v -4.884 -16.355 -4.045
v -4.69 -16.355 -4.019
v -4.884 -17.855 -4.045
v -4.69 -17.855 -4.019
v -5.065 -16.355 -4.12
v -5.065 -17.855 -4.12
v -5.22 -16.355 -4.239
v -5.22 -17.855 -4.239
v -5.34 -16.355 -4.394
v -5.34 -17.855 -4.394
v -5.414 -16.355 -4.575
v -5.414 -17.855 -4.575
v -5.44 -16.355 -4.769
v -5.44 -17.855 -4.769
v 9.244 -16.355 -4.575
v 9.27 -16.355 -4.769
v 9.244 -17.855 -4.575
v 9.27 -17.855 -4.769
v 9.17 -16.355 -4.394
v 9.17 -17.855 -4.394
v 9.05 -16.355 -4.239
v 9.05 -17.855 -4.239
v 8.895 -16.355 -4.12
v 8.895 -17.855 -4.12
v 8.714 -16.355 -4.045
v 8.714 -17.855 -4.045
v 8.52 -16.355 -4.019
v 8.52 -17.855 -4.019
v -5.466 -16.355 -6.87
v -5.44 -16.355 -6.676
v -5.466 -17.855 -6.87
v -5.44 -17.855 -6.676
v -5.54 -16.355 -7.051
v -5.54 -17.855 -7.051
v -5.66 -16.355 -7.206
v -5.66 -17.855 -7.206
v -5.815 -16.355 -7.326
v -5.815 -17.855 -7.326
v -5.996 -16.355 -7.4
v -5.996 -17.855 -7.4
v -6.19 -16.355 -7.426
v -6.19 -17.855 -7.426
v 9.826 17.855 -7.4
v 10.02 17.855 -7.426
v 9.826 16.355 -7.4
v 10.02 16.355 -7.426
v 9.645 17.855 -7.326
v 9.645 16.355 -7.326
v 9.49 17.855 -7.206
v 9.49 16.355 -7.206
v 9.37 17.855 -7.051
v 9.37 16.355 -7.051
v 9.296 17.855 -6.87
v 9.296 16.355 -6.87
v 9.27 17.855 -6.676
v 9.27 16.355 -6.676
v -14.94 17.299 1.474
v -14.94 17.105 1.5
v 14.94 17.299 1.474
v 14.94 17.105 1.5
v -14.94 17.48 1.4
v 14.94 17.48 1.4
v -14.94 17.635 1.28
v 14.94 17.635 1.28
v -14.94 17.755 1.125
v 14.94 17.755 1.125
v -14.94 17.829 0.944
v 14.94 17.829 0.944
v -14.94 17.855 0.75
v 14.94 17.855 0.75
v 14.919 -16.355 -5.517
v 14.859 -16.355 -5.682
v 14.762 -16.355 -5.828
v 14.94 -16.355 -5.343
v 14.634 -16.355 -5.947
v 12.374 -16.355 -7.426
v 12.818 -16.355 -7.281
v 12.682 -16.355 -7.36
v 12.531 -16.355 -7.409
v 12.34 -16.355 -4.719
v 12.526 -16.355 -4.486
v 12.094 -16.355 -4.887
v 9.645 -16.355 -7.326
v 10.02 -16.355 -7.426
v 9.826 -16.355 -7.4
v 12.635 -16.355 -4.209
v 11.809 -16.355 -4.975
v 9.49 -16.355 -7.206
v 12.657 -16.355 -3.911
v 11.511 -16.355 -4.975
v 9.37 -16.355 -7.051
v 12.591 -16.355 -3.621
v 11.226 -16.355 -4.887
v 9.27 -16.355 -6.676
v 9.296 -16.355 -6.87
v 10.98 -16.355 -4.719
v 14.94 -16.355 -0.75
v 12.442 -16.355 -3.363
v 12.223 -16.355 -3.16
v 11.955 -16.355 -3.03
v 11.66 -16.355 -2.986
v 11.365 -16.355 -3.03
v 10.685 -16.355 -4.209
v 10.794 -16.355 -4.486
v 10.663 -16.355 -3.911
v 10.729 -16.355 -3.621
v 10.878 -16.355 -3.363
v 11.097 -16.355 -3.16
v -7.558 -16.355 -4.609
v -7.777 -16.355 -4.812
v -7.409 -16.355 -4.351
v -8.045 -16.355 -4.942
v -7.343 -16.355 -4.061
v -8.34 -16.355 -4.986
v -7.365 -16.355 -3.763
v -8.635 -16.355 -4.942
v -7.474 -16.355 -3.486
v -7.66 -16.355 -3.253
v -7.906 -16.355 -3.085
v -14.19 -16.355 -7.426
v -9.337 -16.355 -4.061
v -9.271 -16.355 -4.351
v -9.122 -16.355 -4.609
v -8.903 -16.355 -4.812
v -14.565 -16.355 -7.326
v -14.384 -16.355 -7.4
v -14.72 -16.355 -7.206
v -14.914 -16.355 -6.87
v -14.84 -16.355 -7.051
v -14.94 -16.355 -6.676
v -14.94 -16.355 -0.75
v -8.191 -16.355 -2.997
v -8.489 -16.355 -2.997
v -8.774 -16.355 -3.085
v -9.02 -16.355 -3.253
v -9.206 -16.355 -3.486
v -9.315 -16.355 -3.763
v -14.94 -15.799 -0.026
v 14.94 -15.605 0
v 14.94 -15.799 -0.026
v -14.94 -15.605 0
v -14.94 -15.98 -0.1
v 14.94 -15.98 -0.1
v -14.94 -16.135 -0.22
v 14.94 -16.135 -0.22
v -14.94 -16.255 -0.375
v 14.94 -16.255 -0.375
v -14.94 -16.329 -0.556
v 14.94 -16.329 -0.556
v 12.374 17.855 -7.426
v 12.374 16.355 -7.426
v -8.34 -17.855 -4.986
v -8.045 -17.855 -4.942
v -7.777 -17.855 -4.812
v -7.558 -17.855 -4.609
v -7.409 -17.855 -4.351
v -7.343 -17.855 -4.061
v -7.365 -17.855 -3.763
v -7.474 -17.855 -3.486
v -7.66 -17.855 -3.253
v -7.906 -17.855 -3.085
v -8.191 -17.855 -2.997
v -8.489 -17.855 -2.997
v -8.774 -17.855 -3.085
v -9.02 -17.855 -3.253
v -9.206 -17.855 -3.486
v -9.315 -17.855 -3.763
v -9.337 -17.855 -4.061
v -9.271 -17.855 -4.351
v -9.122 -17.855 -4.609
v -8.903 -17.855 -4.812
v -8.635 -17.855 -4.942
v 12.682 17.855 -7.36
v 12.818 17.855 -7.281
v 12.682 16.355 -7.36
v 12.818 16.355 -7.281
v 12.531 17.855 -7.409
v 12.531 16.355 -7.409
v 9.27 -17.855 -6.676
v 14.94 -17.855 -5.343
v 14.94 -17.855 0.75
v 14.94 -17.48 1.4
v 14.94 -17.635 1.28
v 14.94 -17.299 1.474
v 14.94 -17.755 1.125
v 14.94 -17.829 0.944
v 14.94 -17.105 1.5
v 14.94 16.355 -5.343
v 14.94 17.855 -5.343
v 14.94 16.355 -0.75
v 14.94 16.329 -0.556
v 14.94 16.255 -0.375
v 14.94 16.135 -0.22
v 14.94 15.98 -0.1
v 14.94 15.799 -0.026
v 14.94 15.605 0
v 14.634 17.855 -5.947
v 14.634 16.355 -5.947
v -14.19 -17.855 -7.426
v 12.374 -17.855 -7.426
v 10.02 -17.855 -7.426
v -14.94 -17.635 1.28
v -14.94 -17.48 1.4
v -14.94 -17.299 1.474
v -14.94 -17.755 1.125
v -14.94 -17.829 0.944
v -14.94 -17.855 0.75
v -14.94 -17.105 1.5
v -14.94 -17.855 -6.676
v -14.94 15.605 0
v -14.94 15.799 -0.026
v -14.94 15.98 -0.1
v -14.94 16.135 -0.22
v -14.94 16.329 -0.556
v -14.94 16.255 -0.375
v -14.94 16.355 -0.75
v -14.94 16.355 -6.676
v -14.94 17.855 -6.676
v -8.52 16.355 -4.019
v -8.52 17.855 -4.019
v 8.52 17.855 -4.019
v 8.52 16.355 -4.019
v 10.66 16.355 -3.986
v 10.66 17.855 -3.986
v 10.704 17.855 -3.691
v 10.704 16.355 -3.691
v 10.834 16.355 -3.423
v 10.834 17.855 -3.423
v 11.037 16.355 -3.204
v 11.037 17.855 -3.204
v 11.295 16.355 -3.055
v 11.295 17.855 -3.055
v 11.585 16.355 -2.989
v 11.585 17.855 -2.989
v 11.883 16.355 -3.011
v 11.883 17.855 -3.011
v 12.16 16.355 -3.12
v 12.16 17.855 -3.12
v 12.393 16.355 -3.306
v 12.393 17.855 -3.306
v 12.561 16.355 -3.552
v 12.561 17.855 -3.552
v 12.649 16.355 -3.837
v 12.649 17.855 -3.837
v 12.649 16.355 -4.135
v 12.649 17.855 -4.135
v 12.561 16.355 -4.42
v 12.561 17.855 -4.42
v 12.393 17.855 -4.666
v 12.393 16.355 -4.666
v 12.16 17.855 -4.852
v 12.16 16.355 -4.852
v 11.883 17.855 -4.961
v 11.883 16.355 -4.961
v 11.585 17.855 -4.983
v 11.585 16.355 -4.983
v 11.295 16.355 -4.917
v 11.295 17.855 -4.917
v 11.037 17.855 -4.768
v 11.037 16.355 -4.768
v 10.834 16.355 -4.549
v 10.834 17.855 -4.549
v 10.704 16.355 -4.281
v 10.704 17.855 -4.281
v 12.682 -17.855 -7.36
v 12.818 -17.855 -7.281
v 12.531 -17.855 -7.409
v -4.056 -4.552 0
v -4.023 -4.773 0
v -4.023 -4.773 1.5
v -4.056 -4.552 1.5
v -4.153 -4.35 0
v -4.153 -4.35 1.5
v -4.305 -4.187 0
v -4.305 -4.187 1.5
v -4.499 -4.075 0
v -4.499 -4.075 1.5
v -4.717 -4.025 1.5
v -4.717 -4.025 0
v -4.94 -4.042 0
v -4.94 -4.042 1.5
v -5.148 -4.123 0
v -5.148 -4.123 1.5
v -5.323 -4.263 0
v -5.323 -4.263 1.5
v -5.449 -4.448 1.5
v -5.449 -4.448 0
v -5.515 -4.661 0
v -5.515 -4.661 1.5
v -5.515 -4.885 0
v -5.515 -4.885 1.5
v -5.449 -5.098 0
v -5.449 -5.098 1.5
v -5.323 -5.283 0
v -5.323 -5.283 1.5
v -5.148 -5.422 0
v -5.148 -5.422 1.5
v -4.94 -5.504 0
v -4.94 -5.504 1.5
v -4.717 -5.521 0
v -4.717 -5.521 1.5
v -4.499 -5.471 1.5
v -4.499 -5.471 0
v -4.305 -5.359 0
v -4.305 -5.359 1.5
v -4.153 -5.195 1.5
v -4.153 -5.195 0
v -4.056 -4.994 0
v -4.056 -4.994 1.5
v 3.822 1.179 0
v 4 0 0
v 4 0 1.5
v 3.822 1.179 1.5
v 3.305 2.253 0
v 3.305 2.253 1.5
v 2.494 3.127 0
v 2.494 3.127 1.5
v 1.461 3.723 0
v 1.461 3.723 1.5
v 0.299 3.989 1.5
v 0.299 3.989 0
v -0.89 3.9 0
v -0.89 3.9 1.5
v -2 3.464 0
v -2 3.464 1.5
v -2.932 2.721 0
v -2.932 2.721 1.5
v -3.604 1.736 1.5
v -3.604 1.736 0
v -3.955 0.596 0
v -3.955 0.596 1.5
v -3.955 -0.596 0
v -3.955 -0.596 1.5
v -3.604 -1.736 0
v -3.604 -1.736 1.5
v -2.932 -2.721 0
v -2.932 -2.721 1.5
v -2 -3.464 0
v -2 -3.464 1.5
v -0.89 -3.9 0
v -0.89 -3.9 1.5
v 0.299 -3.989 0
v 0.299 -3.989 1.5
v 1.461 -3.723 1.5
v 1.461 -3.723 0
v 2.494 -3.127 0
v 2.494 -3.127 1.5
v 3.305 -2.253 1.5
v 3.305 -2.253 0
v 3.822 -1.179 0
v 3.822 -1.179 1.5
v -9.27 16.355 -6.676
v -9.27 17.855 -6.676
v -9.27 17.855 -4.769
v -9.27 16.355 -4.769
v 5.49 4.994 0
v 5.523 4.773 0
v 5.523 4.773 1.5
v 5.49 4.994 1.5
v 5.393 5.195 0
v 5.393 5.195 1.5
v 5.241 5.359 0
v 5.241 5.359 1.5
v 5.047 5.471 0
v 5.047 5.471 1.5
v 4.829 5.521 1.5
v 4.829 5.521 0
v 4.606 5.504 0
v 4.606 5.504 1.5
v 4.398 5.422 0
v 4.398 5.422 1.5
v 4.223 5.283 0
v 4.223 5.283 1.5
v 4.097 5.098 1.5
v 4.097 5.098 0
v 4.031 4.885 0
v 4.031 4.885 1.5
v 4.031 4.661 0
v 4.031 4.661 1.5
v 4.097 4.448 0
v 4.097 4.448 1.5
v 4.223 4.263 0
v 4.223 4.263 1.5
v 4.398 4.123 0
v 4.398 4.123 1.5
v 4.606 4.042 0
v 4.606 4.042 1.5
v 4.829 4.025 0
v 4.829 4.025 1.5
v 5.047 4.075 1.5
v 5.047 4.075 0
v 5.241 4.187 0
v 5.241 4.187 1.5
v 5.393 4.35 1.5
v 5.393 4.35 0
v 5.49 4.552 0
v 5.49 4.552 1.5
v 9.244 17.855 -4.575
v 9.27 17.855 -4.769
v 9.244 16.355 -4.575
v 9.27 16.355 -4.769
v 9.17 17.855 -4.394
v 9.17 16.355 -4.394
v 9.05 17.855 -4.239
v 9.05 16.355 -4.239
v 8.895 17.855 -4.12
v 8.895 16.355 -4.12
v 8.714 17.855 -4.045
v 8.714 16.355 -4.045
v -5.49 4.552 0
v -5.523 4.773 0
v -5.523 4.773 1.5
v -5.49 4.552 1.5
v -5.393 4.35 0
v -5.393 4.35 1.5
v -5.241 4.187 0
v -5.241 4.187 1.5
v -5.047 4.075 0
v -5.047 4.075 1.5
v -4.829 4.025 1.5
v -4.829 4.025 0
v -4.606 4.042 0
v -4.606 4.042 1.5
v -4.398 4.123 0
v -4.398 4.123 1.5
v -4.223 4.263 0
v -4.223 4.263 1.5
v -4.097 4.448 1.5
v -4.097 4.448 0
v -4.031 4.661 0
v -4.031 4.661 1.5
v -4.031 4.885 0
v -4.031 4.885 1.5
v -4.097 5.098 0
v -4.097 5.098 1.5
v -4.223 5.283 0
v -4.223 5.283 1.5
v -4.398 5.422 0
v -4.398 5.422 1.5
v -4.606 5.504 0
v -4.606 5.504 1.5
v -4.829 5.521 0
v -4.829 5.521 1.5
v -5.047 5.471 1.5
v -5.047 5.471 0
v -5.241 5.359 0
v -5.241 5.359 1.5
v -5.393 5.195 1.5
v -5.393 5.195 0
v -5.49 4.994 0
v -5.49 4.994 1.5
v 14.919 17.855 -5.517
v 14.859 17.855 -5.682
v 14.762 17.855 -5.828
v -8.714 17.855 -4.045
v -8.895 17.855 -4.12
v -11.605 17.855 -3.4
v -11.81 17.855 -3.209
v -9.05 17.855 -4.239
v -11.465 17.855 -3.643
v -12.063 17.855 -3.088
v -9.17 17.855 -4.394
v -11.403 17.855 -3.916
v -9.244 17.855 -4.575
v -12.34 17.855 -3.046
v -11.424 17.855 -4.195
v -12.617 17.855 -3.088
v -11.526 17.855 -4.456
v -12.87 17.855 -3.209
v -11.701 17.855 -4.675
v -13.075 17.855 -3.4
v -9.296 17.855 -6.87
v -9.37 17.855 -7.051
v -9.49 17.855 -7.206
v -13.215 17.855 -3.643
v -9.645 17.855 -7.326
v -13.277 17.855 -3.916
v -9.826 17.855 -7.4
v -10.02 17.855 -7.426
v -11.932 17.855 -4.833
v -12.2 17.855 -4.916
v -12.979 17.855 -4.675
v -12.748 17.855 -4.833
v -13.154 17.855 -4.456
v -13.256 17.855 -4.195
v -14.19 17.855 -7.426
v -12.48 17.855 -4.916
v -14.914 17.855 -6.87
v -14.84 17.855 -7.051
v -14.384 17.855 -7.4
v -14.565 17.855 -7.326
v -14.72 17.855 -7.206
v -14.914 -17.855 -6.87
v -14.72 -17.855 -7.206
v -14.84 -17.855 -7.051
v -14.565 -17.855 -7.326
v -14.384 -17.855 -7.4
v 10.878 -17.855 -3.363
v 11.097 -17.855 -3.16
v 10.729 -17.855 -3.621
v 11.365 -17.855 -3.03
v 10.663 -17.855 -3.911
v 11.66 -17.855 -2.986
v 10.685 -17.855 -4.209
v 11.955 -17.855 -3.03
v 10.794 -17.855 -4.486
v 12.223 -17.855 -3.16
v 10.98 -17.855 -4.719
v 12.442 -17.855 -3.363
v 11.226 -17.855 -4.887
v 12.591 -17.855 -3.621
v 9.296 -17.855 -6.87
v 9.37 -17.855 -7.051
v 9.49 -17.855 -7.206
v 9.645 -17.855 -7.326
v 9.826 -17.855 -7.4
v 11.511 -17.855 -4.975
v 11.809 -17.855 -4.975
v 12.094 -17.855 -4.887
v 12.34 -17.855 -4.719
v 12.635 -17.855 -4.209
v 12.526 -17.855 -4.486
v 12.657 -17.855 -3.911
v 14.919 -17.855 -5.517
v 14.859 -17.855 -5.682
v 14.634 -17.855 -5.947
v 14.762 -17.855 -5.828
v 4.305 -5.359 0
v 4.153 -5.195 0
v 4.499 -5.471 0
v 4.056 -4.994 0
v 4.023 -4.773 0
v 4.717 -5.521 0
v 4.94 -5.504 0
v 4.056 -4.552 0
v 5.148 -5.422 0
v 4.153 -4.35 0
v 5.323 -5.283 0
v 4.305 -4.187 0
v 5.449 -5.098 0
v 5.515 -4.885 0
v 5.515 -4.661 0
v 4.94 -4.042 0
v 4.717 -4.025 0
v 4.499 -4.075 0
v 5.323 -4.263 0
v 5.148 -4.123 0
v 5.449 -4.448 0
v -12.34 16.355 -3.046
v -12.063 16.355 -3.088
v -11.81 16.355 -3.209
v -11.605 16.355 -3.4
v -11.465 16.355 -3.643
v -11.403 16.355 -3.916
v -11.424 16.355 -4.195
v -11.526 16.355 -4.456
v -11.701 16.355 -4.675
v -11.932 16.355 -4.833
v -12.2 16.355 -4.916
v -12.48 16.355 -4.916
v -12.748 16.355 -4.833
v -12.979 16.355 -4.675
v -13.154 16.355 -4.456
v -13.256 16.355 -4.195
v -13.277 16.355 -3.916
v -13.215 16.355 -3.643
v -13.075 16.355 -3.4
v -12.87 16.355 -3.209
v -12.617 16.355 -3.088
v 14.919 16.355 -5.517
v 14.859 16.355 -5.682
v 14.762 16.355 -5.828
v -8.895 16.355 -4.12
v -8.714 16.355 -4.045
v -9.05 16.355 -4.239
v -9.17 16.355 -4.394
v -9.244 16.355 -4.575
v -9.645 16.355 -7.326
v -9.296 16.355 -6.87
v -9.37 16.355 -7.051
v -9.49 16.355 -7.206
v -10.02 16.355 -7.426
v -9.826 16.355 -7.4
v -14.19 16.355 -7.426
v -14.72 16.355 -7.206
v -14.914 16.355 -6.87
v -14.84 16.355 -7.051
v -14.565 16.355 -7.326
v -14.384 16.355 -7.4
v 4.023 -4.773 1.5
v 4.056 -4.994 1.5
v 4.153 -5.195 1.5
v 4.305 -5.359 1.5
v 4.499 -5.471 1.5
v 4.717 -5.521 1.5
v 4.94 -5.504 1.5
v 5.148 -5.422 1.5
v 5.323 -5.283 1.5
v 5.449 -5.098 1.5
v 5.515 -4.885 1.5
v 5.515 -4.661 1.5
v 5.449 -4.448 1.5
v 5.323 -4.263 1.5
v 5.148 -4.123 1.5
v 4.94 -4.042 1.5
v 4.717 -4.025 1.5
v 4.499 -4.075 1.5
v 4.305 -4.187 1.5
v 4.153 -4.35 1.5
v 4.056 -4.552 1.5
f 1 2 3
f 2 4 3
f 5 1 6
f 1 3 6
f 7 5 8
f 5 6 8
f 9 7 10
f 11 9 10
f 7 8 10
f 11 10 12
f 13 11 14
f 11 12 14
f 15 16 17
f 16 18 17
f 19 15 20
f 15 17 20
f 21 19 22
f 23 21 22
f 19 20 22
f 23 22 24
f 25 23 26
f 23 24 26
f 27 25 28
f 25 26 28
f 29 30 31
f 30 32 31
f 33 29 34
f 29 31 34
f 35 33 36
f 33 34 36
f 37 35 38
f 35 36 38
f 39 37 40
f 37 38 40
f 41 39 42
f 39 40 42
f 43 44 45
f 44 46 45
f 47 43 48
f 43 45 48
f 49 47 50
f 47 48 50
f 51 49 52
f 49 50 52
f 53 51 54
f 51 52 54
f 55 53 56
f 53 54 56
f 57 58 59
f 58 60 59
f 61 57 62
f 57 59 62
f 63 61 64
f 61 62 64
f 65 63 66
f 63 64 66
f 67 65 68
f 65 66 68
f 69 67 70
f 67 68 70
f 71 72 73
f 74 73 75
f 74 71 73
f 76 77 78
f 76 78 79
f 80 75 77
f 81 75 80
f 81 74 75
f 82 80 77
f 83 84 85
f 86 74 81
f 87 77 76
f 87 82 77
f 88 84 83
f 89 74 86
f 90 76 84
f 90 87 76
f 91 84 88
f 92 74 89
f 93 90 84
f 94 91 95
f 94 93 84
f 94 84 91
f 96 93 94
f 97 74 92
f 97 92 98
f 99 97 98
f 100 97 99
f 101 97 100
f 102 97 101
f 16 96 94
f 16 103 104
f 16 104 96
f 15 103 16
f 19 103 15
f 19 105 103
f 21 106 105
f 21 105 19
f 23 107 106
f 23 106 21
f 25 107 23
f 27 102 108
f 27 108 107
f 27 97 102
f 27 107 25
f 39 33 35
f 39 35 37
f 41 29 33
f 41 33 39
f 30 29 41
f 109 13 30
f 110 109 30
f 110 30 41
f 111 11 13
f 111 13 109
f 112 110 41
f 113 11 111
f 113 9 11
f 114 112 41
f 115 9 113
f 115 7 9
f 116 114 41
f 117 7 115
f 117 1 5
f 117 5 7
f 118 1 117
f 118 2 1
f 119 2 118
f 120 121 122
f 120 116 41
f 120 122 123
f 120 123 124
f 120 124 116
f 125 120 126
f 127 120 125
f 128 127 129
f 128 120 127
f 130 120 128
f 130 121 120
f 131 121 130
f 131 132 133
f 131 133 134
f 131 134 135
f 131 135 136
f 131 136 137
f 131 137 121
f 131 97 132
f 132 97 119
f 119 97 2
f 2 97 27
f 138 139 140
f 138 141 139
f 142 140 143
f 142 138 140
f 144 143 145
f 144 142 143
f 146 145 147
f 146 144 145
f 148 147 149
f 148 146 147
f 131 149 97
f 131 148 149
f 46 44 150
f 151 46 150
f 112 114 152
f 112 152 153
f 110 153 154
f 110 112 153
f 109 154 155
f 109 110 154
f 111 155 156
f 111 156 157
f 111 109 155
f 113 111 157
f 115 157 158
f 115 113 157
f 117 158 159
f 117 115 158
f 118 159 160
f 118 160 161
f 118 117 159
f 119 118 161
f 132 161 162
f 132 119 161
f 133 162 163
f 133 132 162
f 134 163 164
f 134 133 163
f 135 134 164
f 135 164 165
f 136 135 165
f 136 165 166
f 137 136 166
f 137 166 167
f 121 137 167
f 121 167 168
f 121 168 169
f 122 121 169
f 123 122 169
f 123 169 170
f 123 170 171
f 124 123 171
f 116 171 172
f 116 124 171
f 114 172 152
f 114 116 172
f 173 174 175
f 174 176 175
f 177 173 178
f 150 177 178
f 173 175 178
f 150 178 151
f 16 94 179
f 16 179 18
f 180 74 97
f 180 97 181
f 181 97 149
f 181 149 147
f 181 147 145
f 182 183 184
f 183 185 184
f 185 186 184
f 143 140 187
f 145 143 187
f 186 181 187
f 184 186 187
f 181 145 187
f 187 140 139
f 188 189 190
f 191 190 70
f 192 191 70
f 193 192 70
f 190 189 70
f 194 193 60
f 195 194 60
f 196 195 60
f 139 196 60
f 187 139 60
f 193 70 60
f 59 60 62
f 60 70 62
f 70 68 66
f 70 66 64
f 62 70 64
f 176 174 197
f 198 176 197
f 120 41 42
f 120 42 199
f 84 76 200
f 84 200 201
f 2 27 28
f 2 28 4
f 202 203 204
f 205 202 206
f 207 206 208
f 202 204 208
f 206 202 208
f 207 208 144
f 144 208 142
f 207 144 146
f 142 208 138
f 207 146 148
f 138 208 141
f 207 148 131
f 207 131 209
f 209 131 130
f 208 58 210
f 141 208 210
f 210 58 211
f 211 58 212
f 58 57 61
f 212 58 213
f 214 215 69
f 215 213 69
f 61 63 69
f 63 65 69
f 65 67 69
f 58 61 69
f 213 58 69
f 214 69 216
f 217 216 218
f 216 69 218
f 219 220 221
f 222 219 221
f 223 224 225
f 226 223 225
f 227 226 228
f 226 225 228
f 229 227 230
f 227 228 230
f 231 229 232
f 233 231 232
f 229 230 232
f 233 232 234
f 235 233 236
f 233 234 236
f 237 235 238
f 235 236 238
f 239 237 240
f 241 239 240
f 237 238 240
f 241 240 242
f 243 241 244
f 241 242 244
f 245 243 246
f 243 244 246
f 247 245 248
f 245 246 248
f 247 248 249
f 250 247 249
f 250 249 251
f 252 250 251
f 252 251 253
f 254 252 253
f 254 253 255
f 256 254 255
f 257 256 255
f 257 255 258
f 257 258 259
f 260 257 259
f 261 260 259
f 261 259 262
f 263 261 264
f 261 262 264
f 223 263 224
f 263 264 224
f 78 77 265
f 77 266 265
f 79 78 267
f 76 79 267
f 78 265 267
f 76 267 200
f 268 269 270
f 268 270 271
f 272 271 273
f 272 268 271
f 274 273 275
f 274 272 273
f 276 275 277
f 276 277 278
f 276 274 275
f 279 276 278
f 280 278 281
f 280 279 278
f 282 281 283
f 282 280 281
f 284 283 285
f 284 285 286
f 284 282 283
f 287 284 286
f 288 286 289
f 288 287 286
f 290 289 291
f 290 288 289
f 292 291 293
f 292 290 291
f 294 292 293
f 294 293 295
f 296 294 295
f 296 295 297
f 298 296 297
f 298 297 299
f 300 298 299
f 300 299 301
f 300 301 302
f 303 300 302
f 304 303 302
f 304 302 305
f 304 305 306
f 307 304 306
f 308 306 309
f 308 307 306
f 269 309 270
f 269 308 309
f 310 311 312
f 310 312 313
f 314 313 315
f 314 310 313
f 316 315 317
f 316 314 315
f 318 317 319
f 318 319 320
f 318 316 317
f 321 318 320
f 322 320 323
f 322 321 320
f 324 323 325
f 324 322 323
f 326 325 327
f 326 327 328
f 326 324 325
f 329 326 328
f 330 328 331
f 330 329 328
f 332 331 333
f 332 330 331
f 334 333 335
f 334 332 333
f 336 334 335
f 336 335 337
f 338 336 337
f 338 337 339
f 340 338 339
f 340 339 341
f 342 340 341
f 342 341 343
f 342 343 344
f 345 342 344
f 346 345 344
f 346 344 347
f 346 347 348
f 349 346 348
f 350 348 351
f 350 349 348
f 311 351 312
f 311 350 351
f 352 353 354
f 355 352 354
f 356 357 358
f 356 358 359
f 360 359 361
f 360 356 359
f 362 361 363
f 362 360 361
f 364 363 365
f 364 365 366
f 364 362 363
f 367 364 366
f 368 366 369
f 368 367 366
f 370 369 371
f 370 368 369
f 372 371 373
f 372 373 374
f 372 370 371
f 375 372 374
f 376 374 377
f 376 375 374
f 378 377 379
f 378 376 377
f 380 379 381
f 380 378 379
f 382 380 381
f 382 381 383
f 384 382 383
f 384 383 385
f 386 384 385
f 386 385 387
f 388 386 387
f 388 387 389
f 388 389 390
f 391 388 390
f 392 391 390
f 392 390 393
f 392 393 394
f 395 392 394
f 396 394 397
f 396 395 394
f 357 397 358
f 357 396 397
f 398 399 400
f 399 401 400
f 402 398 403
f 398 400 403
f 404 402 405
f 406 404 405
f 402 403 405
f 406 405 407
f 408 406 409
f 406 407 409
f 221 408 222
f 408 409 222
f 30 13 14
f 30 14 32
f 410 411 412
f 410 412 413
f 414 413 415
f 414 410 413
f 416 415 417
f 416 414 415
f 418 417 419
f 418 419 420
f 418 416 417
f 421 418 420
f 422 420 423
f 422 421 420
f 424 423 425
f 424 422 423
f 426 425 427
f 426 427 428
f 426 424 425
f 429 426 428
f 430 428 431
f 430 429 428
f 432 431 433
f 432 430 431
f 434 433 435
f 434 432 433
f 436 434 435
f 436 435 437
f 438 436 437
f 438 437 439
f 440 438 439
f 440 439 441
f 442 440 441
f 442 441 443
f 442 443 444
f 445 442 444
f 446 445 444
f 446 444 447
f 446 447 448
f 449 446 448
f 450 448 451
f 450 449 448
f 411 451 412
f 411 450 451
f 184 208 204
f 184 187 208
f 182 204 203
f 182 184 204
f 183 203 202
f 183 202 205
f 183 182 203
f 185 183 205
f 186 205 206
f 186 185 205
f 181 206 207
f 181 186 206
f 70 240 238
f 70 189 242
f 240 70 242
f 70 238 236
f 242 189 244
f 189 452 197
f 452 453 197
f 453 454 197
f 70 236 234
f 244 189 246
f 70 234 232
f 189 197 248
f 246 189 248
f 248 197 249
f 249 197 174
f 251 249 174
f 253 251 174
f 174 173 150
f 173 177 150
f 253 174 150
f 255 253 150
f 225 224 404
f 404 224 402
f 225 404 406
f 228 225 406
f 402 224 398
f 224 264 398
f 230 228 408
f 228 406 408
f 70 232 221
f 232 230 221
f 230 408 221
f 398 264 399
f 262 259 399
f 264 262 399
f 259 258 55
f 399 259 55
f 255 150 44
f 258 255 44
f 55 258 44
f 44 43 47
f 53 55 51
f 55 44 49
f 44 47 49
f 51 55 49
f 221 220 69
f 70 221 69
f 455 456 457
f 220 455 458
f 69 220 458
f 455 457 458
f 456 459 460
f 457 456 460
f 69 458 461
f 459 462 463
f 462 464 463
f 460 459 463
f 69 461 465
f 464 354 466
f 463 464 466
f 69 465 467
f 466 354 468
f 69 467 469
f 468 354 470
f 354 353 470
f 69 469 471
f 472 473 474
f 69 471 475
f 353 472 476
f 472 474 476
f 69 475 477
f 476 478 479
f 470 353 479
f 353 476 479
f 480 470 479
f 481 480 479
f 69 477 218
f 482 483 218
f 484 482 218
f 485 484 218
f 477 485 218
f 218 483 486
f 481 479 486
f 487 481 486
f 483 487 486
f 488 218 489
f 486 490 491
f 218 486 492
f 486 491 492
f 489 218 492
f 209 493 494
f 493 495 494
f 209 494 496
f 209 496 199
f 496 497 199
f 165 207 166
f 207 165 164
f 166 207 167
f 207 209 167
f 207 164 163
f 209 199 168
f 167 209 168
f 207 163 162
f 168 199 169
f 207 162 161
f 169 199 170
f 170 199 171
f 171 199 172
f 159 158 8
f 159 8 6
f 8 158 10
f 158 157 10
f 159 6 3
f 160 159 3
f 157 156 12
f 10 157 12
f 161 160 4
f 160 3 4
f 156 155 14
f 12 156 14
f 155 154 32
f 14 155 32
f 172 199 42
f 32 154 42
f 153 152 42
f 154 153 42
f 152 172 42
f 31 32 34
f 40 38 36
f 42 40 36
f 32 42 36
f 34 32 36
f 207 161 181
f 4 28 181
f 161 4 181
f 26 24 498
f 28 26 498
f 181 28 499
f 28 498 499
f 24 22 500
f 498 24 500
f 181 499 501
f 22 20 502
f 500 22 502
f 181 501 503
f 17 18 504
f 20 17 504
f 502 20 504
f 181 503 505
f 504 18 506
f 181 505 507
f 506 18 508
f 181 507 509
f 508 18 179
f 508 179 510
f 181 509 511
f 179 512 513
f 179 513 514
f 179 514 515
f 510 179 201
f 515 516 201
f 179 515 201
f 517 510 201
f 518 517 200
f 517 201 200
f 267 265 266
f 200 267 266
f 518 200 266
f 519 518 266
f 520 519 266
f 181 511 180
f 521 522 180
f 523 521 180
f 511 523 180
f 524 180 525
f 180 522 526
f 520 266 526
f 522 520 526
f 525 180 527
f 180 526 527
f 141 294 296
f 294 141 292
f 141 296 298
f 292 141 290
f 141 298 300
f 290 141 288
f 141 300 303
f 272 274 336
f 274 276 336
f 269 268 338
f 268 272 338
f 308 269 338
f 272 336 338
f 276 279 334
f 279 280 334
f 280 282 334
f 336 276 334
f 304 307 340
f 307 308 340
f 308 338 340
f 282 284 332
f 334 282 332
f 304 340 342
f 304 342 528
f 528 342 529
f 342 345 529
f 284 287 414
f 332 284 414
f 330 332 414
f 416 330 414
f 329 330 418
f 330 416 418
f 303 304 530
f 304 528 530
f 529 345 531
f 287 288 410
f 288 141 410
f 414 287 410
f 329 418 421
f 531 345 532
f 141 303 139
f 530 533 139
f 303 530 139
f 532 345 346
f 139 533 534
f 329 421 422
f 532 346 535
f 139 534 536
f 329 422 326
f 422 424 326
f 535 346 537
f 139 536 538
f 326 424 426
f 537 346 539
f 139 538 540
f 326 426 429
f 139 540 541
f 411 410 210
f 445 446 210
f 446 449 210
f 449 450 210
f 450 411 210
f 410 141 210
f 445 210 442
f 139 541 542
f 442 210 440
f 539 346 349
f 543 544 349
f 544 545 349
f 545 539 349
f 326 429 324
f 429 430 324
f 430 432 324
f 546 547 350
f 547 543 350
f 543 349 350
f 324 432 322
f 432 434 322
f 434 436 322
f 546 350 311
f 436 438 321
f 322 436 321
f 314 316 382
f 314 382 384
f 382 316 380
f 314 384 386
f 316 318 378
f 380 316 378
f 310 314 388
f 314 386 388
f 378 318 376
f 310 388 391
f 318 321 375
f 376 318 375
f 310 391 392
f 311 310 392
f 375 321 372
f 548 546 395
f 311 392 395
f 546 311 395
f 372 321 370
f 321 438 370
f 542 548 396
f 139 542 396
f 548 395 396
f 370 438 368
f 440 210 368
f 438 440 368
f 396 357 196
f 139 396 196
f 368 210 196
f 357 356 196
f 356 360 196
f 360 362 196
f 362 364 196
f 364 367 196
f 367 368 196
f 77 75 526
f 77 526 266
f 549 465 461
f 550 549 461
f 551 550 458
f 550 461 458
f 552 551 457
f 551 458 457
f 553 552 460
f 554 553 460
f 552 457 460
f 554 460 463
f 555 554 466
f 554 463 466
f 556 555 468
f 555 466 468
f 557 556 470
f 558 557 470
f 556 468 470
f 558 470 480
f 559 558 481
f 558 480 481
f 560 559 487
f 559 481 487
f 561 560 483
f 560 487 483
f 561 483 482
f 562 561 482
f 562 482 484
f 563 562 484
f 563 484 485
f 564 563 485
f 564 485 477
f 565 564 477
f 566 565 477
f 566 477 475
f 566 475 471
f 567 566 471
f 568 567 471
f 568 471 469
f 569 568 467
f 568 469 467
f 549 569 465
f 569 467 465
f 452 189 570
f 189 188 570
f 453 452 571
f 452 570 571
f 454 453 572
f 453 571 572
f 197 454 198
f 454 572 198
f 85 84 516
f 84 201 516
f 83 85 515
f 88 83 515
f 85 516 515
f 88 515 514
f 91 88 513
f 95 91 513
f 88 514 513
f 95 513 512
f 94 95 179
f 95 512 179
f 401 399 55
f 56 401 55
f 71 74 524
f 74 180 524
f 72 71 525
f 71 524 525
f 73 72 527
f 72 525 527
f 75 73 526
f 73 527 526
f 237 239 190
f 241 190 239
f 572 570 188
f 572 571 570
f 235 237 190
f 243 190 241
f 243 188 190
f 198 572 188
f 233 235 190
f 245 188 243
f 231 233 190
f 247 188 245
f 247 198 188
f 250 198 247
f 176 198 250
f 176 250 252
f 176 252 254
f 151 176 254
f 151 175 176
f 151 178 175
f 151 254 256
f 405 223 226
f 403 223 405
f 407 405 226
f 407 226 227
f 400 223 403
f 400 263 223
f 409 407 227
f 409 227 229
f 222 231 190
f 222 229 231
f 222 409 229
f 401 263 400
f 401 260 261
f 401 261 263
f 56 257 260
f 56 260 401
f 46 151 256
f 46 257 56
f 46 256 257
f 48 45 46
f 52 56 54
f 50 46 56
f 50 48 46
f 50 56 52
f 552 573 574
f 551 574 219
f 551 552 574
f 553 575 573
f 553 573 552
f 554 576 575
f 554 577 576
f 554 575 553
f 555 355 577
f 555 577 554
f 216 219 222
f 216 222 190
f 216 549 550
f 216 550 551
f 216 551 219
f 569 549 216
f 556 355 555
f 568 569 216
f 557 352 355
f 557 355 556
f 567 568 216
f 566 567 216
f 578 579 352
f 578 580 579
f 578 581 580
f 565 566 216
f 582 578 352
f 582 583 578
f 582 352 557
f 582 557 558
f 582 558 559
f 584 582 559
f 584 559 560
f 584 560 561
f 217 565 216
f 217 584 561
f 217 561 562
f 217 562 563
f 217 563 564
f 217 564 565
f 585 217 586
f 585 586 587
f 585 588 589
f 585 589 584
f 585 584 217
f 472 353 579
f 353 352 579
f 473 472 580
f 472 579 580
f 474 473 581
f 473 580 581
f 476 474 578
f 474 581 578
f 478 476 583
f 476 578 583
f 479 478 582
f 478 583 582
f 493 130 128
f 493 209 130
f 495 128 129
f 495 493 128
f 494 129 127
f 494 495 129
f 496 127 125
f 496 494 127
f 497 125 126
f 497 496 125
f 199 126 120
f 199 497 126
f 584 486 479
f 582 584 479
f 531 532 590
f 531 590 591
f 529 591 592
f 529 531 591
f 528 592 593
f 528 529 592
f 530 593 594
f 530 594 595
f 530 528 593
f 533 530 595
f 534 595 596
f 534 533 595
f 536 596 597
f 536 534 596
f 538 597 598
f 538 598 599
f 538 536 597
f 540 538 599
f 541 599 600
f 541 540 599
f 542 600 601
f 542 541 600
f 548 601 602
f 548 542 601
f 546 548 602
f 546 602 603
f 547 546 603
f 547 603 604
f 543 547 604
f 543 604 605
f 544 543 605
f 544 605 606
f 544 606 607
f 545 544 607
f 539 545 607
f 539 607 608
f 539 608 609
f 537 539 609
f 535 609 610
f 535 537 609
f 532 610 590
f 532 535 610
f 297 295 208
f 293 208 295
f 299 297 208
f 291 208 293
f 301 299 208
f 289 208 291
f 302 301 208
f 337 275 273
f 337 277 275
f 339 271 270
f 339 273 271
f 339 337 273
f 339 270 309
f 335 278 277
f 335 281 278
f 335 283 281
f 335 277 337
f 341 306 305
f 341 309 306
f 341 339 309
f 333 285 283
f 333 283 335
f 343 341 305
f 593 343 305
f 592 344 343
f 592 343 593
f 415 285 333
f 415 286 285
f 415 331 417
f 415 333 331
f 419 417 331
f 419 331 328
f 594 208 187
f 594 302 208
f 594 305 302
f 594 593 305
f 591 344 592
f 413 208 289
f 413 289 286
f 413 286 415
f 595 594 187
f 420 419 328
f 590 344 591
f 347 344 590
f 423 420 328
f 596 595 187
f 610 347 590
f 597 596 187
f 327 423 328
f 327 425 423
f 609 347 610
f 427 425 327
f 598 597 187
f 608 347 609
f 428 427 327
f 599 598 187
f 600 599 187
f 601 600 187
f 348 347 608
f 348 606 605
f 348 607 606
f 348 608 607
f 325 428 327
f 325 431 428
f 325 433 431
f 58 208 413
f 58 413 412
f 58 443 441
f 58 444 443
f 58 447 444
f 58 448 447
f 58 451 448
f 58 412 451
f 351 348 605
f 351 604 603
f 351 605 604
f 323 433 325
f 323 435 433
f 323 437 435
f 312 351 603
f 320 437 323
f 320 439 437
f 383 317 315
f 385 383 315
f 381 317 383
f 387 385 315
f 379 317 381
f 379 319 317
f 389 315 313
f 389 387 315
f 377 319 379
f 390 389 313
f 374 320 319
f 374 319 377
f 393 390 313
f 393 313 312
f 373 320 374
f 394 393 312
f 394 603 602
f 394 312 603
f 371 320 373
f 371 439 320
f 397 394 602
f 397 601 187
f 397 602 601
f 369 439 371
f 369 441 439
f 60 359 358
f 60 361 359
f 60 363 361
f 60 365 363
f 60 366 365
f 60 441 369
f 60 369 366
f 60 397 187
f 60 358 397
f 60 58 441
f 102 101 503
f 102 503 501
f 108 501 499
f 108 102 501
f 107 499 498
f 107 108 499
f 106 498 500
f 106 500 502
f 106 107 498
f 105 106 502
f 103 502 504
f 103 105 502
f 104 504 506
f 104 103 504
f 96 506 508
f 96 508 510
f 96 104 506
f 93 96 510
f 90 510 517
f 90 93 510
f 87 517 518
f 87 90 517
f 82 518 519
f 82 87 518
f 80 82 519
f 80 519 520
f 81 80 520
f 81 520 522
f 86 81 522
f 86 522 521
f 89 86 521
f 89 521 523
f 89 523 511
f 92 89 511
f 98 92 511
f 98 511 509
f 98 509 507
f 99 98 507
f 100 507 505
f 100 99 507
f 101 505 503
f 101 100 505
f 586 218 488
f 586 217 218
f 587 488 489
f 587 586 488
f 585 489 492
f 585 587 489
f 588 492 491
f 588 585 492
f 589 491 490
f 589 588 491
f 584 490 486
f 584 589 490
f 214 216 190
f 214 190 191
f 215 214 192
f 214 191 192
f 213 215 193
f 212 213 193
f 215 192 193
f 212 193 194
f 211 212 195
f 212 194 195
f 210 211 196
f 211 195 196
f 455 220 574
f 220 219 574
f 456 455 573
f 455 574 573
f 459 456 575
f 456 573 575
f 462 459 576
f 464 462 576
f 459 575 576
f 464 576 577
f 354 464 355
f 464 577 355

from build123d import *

# Parameters (mm, degrees)
SKETCH1_W           = 29.88
SKETCH1_H           = 35.71
SKETCH1_R           = 4
SKETCH1_R_2         = 0.75
BOSS_EXTRUDE1_DEPTH = 1.5
SKETCH2_R           = 0.94
BOSS_EXTRUDE2_DEPTH = 1.5
BOSS_EXTRUDE3_START = -1.5
SKETCH3_R           = 1
BOSS_EXTRUDE3_DEPTH = 1.5
FILLET1_R           = 0.75


with BuildPart() as part:
    # Sketch1 → Boss-Extrude1 (new body)
    with BuildSketch(Plane.XY):
        Rectangle(SKETCH1_W, SKETCH1_H)
        Circle(SKETCH1_R, mode=Mode.SUBTRACT)
        with Locations((4.772970773, 4.772970773)):
            Circle(SKETCH1_R_2, mode=Mode.SUBTRACT)
        with Locations(Location((4.772970773, -4.772970773, 0), (0, 0, 180))):
            Circle(SKETCH1_R_2, mode=Mode.SUBTRACT)
        with Locations((-4.772970773, -4.772970773)):
            Circle(SKETCH1_R_2, mode=Mode.SUBTRACT)
        with Locations(Location((-4.772970773, 4.772970773, 0), (0, 0, 180))):
            Circle(SKETCH1_R_2, mode=Mode.SUBTRACT)
    extrude(amount=BOSS_EXTRUDE1_DEPTH)

    # Sketch2 → Boss-Extrude2 (add)
    with BuildSketch(Plane(origin=(0, 17.855, 0), x_dir=(1, 0, 0), z_dir=(0, 1, 0))):
        Polygon((-14.94, 7.426000053), (-9.27, 7.426000053), (-9.27, 4.01933008), (9.27, 4.01933008), (9.27, 7.426000053), (12.62, 7.426000053), (14.94, 5.722665067), (14.94, -1.5), (-14.94, -1.5), align=None)
        with Locations(Location((-12.34, 3.986000053, 0), (0, 0, 270))):
            Circle(SKETCH2_R, mode=Mode.SUBTRACT)
        with BuildLine():
            ThreePointArc((12.66, 3.986000053), (11.66, 4.986000053), (10.66, 3.986000053))
            ThreePointArc((10.66, 3.986000053), (11.66, 2.986000053), (12.66, 3.986000053))
        make_face(mode=Mode.SUBTRACT)
    extrude(amount=-BOSS_EXTRUDE2_DEPTH)

    # Sketch3 → Boss-Extrude3 (add)
    with BuildSketch(Plane.XZ.offset(17.855).offset(BOSS_EXTRUDE3_START)):
        Polygon((-14.94, 1.5), (14.94, 1.5), (14.94, -5.722665067), (12.62, -7.426000053), (9.27, -7.426000053), (9.27, -4.01933008), (-5.44, -4.01933008), (-5.44, -7.426000053), (-14.94, -7.426000053), align=None)
        with Locations(Location((11.66, -3.986000053, 0), (0, 0, 90))):
            Circle(SKETCH3_R, mode=Mode.SUBTRACT)
        with Locations(Location((-8.34, -3.986000053, 0), (0, 0, 270))):
            Circle(SKETCH3_R, mode=Mode.SUBTRACT)
    extrude(amount=BOSS_EXTRUDE3_DEPTH)

    # Fillet1
    fillet1_edges = [part.edges().sort_by_distance(p)[0] for p in [
        (0, -17.855, 1.5),
        (-14.94, 17.105, -7.426000053),
        (-9.27, 17.105, -7.426000053),
        (-9.27, 17.105, -4.01933008),
        (9.27, 17.105, -4.01933008),
        (9.27, 17.105, -7.426000053),
        (12.62, 17.105, -7.426000053),
        (14.94, 17.105, -5.722665067),
        (0, 16.355, 0),
        (0, 17.855, 1.5),
        (0, -16.355, 0),
        (-14.94, -17.105, -7.426000053),
        (14.94, -17.105, -5.722665067),
        (12.62, -17.105, -7.426000053),
        (9.27, -17.105, -7.426000053),
        (9.27, -17.105, -4.01933008),
        (-5.44, -17.105, -4.01933008),
        (-5.44, -17.105, -7.426000053),
    ]]
    fillet(fillet1_edges, radius=FILLET1_R)


solid = part.part
